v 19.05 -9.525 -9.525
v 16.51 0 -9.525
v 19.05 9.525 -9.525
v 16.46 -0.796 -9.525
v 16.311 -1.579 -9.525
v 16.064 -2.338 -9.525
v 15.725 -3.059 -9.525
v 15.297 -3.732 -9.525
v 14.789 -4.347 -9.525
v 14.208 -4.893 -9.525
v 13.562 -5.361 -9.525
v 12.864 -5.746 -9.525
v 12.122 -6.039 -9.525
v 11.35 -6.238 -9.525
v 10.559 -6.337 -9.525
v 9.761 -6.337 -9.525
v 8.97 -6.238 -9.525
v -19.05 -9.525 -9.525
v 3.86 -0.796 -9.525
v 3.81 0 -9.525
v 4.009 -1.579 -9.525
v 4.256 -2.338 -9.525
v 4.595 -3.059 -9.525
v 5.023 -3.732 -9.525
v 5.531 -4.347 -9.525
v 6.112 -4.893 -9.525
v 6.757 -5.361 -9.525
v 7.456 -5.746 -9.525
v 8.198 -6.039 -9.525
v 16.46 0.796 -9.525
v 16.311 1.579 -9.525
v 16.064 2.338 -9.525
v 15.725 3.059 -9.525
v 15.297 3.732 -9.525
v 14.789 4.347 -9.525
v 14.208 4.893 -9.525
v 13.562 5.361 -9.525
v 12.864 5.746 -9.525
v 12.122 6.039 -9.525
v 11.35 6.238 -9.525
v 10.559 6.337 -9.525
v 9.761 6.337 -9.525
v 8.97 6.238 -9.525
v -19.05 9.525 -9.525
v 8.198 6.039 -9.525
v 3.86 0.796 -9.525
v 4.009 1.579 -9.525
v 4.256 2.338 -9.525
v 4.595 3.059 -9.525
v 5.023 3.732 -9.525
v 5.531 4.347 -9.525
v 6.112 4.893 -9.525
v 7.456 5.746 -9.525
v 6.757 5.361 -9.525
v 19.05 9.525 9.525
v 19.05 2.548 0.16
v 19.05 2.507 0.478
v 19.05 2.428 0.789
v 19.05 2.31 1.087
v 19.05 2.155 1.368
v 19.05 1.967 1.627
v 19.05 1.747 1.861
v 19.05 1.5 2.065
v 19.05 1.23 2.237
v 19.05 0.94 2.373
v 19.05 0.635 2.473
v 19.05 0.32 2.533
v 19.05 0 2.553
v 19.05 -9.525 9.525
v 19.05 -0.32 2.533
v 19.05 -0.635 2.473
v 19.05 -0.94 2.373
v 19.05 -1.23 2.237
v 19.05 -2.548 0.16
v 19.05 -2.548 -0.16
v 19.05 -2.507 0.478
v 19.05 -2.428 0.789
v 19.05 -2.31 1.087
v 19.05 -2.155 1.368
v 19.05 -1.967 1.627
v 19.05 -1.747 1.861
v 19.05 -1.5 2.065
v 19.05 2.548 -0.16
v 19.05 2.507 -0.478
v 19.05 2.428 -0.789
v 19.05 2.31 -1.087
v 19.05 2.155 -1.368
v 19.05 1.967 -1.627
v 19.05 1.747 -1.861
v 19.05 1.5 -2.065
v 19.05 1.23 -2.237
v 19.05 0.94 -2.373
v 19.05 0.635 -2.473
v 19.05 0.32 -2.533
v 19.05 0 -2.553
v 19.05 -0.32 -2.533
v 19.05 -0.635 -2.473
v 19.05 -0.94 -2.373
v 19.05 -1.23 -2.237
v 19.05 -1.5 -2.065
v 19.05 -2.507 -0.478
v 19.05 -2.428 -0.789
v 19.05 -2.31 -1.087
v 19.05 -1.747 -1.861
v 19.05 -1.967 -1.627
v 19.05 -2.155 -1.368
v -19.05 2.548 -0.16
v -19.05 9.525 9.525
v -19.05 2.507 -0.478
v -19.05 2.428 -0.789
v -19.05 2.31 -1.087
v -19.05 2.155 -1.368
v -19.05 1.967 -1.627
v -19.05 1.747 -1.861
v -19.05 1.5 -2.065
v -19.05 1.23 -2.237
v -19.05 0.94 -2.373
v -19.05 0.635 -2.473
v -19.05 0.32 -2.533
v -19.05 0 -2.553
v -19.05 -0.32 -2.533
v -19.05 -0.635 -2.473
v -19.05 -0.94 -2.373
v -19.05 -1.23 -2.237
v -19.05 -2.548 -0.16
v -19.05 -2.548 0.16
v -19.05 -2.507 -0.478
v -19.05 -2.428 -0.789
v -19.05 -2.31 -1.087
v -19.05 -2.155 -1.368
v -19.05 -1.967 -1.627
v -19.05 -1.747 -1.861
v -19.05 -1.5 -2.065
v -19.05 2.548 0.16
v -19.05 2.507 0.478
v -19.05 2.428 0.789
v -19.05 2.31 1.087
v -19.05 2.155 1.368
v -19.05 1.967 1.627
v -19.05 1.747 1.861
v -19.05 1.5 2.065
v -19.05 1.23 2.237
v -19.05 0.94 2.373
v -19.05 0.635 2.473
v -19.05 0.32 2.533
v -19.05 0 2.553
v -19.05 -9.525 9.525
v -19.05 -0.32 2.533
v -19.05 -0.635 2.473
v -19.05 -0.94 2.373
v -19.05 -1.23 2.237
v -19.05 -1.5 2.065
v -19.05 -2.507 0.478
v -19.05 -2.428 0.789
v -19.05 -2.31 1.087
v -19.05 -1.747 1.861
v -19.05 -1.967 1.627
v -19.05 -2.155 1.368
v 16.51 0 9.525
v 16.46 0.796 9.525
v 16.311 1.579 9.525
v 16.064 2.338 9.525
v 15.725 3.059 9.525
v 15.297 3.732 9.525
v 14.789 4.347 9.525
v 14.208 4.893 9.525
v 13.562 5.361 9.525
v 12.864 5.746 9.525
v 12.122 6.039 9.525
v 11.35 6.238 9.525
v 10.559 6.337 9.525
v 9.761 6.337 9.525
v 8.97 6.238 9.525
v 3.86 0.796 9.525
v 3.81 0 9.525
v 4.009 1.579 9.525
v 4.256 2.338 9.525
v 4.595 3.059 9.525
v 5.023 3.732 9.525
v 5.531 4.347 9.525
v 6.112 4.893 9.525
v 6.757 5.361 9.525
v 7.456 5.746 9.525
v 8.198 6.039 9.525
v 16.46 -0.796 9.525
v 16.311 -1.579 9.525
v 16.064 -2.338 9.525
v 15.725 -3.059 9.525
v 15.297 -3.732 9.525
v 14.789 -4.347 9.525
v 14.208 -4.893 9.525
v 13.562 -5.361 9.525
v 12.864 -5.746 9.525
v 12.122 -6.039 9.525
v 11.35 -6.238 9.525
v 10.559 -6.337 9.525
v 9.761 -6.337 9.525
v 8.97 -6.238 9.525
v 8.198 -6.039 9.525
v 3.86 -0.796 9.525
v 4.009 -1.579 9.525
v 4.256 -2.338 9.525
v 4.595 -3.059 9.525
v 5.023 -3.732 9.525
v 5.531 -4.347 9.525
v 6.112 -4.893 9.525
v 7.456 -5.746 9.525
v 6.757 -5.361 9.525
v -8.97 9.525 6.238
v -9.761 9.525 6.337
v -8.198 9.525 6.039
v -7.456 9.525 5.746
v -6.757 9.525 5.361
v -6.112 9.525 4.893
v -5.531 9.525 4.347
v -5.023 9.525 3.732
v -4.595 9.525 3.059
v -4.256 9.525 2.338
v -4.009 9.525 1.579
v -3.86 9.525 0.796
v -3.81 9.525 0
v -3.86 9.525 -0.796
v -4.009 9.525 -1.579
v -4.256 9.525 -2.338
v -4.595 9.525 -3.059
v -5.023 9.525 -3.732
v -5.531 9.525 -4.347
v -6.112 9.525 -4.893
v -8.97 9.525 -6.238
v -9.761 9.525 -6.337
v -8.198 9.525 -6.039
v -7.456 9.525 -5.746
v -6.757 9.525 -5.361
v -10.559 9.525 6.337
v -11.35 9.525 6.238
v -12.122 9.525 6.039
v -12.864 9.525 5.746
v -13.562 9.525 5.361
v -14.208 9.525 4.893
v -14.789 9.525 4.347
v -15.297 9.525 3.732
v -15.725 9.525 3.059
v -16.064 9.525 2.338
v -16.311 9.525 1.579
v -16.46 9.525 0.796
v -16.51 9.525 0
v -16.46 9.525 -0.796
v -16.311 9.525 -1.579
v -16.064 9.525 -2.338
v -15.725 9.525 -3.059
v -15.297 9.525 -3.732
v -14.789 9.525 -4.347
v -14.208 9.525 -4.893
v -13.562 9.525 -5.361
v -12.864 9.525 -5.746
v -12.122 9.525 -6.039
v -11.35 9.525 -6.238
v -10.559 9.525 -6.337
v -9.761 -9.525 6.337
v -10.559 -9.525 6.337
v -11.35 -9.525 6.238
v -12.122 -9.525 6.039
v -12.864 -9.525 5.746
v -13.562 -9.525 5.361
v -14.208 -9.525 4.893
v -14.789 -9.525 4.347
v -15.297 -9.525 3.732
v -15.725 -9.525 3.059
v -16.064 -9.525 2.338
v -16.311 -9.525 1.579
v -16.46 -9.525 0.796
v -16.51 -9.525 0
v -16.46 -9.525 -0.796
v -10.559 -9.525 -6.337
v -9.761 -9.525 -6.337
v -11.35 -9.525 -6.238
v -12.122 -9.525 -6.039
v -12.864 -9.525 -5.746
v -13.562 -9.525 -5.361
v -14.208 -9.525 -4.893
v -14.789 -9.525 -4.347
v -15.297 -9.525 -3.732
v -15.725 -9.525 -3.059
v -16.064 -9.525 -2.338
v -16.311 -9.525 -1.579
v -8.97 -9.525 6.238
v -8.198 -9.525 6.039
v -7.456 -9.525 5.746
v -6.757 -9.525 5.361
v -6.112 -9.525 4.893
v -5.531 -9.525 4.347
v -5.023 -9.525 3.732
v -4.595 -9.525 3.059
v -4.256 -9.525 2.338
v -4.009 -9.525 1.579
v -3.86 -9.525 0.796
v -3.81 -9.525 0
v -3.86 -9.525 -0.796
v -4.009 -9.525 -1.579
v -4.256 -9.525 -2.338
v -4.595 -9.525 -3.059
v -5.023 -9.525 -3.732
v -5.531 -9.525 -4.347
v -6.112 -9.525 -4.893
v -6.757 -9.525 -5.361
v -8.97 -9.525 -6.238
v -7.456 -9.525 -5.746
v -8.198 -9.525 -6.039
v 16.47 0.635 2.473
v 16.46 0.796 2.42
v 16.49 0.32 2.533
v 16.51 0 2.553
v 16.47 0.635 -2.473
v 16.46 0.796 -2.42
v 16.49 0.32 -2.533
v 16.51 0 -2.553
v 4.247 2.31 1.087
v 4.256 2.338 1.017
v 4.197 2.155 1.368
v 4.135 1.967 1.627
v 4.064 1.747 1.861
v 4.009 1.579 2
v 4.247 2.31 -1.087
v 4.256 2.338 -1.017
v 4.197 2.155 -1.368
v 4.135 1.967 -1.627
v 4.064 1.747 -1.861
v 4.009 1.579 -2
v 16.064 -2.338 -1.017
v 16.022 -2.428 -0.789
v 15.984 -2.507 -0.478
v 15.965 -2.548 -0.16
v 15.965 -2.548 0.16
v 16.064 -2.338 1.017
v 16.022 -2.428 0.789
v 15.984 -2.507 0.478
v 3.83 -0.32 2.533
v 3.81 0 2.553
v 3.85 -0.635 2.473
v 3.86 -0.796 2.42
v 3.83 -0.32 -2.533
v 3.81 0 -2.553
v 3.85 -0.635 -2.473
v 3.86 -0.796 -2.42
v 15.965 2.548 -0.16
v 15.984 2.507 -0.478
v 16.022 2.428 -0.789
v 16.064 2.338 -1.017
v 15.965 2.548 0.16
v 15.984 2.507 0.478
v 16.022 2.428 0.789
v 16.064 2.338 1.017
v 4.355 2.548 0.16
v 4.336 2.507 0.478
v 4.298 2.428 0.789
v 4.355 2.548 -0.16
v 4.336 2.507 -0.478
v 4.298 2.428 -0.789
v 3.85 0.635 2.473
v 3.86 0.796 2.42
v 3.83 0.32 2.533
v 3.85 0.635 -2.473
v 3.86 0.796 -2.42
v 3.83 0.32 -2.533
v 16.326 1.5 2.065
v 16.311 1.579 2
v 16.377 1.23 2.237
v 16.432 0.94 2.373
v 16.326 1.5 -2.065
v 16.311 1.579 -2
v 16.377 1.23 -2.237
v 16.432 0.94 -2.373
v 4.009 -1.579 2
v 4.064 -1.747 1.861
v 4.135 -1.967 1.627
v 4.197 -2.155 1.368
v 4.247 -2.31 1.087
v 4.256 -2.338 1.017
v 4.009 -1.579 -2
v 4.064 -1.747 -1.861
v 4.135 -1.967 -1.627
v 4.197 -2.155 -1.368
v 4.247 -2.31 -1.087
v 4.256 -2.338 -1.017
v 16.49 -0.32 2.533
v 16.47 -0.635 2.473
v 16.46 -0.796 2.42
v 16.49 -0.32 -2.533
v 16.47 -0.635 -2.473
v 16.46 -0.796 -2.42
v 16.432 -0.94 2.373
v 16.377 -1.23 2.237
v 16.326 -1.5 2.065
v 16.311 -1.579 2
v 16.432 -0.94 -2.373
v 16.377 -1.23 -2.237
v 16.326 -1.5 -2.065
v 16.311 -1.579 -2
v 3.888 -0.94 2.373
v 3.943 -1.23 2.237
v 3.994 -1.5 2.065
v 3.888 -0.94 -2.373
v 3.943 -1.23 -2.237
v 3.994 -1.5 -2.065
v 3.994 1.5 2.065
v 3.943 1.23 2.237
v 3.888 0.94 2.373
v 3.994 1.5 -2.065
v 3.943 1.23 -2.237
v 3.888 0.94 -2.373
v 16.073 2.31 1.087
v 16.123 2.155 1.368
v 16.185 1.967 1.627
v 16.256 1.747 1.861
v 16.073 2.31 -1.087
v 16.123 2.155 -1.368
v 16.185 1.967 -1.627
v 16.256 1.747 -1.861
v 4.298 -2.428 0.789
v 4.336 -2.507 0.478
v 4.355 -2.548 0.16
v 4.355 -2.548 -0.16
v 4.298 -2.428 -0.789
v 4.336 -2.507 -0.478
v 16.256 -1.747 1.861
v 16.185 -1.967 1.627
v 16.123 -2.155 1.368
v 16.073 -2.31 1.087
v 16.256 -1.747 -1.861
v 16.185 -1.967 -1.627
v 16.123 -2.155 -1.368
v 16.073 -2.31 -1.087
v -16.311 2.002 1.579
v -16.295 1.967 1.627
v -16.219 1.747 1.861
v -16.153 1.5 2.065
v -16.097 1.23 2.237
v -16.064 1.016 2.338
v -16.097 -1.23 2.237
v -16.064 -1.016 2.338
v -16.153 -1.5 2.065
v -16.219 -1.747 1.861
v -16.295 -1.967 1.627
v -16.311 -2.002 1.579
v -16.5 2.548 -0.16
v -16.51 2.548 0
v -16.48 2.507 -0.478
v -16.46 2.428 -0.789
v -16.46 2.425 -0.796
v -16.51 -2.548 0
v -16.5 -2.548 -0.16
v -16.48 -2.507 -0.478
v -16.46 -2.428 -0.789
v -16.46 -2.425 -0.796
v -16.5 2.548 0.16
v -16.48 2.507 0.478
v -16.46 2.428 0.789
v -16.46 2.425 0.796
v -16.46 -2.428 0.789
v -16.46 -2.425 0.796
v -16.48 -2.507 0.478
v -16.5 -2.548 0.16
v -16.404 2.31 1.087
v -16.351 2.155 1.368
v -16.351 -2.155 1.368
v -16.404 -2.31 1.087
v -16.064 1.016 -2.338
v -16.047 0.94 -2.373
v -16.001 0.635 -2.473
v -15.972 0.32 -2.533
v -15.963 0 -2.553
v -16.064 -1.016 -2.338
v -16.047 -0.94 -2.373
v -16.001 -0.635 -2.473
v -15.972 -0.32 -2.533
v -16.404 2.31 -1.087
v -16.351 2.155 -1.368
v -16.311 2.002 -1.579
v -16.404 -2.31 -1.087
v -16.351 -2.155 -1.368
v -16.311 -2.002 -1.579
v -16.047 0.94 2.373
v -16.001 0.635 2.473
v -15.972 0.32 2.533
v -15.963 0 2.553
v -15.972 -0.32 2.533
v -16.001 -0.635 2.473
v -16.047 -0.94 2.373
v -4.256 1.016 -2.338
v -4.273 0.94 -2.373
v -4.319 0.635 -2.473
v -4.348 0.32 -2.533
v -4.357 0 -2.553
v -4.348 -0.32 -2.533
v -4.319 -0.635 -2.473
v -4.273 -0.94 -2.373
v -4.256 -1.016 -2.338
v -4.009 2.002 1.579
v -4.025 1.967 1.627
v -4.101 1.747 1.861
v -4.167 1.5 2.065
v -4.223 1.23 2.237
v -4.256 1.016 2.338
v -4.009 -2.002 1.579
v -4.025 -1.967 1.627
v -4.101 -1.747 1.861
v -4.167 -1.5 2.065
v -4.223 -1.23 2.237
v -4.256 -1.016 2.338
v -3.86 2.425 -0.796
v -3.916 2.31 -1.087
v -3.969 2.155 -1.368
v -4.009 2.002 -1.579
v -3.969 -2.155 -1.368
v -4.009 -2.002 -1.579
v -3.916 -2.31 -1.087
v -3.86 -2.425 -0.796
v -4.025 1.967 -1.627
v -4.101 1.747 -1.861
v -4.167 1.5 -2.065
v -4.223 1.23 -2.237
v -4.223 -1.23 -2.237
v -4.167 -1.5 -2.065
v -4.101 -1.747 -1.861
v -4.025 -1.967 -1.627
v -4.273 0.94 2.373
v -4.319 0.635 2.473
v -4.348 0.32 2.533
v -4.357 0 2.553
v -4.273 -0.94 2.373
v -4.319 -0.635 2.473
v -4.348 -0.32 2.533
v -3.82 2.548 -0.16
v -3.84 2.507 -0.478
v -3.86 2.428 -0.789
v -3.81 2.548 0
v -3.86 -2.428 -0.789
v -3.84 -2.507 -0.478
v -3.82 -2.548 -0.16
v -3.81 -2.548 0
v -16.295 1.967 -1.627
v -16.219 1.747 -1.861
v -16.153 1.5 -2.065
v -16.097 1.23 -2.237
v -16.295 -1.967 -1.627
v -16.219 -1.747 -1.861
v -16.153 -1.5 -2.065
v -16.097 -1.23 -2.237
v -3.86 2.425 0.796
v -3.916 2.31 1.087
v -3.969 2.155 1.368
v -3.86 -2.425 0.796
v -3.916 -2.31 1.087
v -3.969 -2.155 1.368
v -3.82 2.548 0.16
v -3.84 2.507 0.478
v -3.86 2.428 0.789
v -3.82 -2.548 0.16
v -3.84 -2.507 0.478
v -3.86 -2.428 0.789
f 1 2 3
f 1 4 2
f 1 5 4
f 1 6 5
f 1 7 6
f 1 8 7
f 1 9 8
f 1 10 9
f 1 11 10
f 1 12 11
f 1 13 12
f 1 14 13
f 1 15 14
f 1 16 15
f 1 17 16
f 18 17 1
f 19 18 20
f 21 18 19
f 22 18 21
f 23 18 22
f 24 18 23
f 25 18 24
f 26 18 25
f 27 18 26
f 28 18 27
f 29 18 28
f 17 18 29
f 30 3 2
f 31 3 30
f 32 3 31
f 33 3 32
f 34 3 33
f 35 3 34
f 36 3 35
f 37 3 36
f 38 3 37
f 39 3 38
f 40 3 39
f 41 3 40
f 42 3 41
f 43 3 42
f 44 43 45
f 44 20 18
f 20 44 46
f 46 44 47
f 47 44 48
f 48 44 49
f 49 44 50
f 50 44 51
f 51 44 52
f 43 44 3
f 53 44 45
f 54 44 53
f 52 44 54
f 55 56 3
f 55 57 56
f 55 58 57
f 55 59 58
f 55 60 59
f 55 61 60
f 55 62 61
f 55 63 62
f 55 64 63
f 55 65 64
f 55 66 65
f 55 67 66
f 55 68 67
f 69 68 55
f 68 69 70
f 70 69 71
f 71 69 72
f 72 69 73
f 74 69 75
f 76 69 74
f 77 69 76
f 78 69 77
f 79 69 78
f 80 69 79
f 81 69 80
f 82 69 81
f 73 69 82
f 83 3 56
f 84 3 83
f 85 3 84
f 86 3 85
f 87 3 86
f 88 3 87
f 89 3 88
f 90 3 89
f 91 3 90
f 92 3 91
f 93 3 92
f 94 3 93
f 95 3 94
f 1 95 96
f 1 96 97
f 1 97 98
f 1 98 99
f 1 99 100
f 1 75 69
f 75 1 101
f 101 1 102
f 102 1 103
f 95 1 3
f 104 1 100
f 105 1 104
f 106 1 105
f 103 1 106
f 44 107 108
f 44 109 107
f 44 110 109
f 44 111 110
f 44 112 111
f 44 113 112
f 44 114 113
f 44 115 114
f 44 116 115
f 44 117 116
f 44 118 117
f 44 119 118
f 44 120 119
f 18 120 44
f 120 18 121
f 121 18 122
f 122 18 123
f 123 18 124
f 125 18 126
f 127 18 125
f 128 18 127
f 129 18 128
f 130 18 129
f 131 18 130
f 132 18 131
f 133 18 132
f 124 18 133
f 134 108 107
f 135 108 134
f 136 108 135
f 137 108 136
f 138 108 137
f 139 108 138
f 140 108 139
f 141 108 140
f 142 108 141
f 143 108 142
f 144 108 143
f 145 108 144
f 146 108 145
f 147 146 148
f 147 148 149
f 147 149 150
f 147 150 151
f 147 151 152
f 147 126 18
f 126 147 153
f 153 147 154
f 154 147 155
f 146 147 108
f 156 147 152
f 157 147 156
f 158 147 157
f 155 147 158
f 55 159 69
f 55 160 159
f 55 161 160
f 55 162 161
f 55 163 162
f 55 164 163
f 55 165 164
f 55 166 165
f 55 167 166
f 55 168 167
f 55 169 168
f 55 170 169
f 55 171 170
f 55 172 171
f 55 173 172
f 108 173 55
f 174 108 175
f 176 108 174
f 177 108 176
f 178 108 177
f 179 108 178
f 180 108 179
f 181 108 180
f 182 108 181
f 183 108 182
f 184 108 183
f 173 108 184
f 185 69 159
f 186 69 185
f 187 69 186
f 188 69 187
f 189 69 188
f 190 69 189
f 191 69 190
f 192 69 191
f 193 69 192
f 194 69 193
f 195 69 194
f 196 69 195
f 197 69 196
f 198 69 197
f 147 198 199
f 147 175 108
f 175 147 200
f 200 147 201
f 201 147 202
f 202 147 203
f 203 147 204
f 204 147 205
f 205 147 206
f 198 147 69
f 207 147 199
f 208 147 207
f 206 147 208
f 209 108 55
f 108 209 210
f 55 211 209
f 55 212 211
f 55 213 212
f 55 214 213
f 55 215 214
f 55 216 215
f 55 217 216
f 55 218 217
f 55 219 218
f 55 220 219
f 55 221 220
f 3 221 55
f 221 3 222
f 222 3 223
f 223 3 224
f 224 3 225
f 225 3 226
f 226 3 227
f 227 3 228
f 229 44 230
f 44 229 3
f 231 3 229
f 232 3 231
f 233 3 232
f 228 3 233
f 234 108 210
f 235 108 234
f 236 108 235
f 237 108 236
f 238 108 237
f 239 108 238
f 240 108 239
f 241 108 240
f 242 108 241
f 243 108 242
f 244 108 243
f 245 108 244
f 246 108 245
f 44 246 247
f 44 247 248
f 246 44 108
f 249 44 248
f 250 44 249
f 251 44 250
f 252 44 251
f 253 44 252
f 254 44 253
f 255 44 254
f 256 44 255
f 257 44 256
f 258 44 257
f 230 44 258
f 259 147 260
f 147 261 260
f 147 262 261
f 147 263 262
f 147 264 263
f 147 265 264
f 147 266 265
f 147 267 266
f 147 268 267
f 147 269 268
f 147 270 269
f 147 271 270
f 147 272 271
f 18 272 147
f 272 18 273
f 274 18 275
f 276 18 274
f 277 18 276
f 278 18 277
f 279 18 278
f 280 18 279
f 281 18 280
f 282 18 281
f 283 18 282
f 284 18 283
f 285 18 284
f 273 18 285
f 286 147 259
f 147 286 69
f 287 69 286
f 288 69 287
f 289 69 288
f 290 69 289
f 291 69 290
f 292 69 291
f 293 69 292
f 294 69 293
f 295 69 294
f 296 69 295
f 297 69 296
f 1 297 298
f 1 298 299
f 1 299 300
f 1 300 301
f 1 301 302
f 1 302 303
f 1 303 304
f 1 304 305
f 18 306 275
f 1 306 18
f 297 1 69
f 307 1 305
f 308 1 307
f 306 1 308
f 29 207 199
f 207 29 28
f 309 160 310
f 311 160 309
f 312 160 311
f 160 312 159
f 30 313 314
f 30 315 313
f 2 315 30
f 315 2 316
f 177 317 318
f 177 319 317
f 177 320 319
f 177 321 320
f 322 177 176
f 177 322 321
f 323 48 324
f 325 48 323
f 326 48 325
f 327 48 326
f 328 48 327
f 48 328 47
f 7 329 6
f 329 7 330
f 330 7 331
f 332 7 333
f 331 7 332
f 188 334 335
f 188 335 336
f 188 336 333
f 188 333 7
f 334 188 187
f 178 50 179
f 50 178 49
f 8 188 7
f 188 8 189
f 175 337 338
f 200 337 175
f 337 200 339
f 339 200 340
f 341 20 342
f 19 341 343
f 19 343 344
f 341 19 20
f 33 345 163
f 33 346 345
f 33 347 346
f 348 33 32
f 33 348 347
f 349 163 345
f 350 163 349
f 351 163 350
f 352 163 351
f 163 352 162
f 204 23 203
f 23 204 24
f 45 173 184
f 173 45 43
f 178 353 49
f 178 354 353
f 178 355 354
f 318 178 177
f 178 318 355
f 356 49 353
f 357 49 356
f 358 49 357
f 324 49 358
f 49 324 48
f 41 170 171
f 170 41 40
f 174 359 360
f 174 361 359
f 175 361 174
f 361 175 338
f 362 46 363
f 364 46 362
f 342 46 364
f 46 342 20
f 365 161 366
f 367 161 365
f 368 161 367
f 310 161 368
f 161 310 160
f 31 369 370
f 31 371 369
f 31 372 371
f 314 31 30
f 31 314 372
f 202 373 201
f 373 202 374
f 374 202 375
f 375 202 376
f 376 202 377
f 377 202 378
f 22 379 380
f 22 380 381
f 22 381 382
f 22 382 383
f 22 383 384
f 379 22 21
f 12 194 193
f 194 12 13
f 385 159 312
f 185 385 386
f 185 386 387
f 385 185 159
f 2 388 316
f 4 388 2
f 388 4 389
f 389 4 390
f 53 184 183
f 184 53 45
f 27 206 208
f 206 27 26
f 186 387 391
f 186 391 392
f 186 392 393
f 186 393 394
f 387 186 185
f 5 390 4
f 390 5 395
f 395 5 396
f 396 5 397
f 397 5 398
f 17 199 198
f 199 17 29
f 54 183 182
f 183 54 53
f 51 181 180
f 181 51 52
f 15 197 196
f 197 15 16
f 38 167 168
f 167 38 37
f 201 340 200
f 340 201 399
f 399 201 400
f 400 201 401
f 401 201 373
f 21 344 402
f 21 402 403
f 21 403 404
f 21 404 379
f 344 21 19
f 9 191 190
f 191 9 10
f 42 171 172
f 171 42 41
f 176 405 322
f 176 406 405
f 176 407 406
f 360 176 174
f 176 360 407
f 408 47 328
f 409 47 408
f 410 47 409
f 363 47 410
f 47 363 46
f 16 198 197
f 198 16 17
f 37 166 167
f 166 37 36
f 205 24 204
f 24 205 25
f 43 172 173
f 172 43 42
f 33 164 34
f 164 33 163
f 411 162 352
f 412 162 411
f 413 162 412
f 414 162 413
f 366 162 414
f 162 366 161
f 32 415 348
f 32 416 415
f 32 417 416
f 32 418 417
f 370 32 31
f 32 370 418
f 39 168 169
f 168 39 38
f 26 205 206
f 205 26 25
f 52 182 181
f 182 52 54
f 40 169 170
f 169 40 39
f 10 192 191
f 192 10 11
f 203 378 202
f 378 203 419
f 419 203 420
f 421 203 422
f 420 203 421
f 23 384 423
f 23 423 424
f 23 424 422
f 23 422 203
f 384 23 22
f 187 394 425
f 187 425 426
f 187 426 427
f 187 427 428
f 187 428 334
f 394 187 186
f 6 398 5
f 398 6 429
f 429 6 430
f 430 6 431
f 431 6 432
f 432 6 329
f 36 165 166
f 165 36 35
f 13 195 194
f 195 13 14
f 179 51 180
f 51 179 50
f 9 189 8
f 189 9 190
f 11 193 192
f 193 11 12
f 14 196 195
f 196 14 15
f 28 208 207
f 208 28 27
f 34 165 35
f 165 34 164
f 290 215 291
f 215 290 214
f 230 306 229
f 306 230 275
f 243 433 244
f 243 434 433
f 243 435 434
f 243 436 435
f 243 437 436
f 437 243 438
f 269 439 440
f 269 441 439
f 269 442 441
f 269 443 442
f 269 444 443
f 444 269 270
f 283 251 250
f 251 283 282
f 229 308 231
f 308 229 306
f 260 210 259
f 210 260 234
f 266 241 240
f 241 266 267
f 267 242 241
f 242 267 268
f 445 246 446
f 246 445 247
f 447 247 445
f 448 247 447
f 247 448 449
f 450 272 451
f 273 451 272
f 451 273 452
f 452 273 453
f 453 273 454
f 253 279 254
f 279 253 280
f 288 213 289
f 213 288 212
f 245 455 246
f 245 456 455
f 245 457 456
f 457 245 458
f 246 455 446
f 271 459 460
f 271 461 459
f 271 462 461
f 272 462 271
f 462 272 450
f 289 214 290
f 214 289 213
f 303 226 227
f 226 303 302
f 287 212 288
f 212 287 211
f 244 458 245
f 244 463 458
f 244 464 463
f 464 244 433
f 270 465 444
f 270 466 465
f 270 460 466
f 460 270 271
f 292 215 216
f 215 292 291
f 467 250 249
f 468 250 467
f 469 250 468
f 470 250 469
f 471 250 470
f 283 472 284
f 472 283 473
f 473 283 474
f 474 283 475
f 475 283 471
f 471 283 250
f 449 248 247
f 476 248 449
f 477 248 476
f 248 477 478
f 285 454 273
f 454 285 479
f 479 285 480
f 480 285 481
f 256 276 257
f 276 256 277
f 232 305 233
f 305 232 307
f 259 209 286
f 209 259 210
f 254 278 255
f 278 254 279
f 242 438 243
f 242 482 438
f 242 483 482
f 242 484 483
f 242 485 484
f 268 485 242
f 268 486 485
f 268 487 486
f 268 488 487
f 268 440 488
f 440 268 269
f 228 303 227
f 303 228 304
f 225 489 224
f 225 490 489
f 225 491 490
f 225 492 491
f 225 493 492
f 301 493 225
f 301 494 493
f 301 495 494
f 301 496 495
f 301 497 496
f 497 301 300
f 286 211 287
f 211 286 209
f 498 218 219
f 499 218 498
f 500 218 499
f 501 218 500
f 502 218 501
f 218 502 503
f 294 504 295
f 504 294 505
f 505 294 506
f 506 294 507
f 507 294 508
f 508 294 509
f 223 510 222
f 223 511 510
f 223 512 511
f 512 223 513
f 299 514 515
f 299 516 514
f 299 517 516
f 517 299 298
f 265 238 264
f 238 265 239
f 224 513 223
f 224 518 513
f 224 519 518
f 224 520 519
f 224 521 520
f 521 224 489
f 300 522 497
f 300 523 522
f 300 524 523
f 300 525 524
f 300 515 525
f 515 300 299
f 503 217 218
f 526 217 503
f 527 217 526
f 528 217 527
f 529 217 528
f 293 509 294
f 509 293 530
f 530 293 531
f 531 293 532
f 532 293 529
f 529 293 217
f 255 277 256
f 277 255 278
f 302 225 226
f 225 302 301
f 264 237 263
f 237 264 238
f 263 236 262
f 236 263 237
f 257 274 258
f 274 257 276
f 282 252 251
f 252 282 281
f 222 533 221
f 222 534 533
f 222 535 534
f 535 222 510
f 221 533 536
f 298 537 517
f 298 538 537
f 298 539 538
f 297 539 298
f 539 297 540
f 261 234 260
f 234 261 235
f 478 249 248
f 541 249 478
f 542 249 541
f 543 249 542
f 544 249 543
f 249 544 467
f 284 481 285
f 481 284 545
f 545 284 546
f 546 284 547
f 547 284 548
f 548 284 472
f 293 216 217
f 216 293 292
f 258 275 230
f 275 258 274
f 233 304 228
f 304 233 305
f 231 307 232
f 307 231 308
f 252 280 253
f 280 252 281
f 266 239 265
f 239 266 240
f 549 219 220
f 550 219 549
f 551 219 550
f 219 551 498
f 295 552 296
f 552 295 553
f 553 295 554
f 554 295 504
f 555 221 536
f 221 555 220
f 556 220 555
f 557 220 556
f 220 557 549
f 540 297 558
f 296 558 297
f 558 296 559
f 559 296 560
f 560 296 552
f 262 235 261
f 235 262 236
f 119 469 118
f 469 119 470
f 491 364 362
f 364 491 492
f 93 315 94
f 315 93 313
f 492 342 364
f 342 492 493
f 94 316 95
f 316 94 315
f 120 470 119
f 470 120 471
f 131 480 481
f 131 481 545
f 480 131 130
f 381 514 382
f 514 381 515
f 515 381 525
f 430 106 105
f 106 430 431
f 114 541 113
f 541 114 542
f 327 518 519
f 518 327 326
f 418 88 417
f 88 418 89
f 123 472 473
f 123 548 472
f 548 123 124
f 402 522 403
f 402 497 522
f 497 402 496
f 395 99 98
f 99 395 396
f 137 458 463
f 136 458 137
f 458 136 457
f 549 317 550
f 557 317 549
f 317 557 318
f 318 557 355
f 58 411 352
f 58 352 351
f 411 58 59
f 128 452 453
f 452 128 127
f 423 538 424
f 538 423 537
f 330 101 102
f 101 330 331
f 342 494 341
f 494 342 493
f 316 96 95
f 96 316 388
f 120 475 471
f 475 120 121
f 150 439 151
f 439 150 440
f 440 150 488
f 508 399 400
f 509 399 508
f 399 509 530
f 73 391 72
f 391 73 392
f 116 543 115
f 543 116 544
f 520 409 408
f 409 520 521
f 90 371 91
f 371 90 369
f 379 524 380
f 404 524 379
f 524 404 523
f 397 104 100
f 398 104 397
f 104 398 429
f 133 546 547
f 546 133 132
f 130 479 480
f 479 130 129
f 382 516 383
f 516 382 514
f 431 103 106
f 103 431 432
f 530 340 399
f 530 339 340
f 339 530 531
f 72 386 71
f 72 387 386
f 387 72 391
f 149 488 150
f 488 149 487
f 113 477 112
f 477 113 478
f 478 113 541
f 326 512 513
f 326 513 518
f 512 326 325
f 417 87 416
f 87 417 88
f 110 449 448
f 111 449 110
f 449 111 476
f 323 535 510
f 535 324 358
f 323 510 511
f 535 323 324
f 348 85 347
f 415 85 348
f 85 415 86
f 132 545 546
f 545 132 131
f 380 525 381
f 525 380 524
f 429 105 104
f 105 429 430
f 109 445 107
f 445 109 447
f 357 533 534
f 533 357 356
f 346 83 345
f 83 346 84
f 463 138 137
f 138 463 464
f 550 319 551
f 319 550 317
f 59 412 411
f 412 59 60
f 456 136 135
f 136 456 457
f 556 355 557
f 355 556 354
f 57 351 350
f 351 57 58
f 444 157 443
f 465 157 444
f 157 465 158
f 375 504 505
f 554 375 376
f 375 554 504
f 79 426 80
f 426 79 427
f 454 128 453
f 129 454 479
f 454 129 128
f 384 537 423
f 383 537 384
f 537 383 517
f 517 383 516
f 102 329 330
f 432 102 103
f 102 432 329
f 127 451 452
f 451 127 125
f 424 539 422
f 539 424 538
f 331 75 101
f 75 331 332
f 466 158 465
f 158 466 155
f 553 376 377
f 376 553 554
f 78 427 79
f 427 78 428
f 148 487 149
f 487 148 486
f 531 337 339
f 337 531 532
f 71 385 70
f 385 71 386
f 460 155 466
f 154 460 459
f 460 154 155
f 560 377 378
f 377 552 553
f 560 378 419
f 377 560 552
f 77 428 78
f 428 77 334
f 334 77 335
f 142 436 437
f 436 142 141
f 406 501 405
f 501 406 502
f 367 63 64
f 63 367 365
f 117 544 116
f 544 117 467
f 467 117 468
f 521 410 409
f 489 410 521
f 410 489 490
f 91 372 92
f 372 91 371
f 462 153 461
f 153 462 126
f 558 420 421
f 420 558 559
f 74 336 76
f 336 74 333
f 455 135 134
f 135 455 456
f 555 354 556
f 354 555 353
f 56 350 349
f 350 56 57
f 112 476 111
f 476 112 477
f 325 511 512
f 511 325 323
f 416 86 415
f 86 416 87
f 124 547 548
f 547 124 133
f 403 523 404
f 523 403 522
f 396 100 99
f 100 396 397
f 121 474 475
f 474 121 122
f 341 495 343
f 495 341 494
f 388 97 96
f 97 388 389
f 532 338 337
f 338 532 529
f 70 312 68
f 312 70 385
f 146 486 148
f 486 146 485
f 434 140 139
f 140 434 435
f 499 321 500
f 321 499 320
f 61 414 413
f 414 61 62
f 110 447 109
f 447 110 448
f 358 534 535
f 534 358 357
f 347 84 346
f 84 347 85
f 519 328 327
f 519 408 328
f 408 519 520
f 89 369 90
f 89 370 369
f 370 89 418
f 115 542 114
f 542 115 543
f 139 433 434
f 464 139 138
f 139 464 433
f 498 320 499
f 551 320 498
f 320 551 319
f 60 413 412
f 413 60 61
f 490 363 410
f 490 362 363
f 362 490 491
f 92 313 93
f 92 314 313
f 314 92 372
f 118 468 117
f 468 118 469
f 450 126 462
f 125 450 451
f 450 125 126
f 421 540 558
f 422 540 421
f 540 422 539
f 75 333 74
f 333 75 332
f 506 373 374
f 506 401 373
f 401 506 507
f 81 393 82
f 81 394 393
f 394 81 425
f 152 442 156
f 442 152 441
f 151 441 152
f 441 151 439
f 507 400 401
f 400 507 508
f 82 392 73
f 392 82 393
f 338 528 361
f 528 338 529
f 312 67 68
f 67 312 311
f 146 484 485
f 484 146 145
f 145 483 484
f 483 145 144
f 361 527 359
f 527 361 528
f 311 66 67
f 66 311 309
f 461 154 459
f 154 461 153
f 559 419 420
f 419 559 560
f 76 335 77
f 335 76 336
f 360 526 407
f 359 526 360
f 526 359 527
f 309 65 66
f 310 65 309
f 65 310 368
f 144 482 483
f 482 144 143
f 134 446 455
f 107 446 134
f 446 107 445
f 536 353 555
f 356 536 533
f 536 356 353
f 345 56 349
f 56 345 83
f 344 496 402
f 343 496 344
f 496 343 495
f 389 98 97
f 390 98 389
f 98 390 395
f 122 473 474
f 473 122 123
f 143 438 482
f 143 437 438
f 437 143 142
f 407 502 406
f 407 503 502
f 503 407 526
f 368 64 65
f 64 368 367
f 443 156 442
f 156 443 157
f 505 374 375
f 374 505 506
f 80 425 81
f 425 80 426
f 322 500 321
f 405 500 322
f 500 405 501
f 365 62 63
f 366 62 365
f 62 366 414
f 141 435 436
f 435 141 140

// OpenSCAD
$fn = 50;
//$fa = 0.01;
//$fs = 0.5;


in=25.4;
l=0.62*in;
lSide=0.75*in;
w=1.5*in;
h=1.5*in;
d=1*in;

dHole=0.5*in;
dLip=0.935*in;

d8=0.136*in;
d4=0.201*in;

render(convexity=3)
{

rotate([0,90,0])
		difference()
		{
		cube([lSide,lSide,h], center=true); //Body 
		//translate([0,0,-h*0.275]) cylinder(h=100, r=dHole/2); //Hole
		//translate([0,0,-10]) cylinder(h=100, r=dLip/2); //Lip diameter

		translate([0,0,0.4*in]) rotate([0,90,0])  cylinder(h=300, r=dHole/2, center=true); //
		translate([0,0,-0.4*in]) rotate([90,90,0])  cylinder(h=300, r=dHole/2, center=true); //
		cylinder(h=1000, r=d4/2, center=true);

		


		}


}
